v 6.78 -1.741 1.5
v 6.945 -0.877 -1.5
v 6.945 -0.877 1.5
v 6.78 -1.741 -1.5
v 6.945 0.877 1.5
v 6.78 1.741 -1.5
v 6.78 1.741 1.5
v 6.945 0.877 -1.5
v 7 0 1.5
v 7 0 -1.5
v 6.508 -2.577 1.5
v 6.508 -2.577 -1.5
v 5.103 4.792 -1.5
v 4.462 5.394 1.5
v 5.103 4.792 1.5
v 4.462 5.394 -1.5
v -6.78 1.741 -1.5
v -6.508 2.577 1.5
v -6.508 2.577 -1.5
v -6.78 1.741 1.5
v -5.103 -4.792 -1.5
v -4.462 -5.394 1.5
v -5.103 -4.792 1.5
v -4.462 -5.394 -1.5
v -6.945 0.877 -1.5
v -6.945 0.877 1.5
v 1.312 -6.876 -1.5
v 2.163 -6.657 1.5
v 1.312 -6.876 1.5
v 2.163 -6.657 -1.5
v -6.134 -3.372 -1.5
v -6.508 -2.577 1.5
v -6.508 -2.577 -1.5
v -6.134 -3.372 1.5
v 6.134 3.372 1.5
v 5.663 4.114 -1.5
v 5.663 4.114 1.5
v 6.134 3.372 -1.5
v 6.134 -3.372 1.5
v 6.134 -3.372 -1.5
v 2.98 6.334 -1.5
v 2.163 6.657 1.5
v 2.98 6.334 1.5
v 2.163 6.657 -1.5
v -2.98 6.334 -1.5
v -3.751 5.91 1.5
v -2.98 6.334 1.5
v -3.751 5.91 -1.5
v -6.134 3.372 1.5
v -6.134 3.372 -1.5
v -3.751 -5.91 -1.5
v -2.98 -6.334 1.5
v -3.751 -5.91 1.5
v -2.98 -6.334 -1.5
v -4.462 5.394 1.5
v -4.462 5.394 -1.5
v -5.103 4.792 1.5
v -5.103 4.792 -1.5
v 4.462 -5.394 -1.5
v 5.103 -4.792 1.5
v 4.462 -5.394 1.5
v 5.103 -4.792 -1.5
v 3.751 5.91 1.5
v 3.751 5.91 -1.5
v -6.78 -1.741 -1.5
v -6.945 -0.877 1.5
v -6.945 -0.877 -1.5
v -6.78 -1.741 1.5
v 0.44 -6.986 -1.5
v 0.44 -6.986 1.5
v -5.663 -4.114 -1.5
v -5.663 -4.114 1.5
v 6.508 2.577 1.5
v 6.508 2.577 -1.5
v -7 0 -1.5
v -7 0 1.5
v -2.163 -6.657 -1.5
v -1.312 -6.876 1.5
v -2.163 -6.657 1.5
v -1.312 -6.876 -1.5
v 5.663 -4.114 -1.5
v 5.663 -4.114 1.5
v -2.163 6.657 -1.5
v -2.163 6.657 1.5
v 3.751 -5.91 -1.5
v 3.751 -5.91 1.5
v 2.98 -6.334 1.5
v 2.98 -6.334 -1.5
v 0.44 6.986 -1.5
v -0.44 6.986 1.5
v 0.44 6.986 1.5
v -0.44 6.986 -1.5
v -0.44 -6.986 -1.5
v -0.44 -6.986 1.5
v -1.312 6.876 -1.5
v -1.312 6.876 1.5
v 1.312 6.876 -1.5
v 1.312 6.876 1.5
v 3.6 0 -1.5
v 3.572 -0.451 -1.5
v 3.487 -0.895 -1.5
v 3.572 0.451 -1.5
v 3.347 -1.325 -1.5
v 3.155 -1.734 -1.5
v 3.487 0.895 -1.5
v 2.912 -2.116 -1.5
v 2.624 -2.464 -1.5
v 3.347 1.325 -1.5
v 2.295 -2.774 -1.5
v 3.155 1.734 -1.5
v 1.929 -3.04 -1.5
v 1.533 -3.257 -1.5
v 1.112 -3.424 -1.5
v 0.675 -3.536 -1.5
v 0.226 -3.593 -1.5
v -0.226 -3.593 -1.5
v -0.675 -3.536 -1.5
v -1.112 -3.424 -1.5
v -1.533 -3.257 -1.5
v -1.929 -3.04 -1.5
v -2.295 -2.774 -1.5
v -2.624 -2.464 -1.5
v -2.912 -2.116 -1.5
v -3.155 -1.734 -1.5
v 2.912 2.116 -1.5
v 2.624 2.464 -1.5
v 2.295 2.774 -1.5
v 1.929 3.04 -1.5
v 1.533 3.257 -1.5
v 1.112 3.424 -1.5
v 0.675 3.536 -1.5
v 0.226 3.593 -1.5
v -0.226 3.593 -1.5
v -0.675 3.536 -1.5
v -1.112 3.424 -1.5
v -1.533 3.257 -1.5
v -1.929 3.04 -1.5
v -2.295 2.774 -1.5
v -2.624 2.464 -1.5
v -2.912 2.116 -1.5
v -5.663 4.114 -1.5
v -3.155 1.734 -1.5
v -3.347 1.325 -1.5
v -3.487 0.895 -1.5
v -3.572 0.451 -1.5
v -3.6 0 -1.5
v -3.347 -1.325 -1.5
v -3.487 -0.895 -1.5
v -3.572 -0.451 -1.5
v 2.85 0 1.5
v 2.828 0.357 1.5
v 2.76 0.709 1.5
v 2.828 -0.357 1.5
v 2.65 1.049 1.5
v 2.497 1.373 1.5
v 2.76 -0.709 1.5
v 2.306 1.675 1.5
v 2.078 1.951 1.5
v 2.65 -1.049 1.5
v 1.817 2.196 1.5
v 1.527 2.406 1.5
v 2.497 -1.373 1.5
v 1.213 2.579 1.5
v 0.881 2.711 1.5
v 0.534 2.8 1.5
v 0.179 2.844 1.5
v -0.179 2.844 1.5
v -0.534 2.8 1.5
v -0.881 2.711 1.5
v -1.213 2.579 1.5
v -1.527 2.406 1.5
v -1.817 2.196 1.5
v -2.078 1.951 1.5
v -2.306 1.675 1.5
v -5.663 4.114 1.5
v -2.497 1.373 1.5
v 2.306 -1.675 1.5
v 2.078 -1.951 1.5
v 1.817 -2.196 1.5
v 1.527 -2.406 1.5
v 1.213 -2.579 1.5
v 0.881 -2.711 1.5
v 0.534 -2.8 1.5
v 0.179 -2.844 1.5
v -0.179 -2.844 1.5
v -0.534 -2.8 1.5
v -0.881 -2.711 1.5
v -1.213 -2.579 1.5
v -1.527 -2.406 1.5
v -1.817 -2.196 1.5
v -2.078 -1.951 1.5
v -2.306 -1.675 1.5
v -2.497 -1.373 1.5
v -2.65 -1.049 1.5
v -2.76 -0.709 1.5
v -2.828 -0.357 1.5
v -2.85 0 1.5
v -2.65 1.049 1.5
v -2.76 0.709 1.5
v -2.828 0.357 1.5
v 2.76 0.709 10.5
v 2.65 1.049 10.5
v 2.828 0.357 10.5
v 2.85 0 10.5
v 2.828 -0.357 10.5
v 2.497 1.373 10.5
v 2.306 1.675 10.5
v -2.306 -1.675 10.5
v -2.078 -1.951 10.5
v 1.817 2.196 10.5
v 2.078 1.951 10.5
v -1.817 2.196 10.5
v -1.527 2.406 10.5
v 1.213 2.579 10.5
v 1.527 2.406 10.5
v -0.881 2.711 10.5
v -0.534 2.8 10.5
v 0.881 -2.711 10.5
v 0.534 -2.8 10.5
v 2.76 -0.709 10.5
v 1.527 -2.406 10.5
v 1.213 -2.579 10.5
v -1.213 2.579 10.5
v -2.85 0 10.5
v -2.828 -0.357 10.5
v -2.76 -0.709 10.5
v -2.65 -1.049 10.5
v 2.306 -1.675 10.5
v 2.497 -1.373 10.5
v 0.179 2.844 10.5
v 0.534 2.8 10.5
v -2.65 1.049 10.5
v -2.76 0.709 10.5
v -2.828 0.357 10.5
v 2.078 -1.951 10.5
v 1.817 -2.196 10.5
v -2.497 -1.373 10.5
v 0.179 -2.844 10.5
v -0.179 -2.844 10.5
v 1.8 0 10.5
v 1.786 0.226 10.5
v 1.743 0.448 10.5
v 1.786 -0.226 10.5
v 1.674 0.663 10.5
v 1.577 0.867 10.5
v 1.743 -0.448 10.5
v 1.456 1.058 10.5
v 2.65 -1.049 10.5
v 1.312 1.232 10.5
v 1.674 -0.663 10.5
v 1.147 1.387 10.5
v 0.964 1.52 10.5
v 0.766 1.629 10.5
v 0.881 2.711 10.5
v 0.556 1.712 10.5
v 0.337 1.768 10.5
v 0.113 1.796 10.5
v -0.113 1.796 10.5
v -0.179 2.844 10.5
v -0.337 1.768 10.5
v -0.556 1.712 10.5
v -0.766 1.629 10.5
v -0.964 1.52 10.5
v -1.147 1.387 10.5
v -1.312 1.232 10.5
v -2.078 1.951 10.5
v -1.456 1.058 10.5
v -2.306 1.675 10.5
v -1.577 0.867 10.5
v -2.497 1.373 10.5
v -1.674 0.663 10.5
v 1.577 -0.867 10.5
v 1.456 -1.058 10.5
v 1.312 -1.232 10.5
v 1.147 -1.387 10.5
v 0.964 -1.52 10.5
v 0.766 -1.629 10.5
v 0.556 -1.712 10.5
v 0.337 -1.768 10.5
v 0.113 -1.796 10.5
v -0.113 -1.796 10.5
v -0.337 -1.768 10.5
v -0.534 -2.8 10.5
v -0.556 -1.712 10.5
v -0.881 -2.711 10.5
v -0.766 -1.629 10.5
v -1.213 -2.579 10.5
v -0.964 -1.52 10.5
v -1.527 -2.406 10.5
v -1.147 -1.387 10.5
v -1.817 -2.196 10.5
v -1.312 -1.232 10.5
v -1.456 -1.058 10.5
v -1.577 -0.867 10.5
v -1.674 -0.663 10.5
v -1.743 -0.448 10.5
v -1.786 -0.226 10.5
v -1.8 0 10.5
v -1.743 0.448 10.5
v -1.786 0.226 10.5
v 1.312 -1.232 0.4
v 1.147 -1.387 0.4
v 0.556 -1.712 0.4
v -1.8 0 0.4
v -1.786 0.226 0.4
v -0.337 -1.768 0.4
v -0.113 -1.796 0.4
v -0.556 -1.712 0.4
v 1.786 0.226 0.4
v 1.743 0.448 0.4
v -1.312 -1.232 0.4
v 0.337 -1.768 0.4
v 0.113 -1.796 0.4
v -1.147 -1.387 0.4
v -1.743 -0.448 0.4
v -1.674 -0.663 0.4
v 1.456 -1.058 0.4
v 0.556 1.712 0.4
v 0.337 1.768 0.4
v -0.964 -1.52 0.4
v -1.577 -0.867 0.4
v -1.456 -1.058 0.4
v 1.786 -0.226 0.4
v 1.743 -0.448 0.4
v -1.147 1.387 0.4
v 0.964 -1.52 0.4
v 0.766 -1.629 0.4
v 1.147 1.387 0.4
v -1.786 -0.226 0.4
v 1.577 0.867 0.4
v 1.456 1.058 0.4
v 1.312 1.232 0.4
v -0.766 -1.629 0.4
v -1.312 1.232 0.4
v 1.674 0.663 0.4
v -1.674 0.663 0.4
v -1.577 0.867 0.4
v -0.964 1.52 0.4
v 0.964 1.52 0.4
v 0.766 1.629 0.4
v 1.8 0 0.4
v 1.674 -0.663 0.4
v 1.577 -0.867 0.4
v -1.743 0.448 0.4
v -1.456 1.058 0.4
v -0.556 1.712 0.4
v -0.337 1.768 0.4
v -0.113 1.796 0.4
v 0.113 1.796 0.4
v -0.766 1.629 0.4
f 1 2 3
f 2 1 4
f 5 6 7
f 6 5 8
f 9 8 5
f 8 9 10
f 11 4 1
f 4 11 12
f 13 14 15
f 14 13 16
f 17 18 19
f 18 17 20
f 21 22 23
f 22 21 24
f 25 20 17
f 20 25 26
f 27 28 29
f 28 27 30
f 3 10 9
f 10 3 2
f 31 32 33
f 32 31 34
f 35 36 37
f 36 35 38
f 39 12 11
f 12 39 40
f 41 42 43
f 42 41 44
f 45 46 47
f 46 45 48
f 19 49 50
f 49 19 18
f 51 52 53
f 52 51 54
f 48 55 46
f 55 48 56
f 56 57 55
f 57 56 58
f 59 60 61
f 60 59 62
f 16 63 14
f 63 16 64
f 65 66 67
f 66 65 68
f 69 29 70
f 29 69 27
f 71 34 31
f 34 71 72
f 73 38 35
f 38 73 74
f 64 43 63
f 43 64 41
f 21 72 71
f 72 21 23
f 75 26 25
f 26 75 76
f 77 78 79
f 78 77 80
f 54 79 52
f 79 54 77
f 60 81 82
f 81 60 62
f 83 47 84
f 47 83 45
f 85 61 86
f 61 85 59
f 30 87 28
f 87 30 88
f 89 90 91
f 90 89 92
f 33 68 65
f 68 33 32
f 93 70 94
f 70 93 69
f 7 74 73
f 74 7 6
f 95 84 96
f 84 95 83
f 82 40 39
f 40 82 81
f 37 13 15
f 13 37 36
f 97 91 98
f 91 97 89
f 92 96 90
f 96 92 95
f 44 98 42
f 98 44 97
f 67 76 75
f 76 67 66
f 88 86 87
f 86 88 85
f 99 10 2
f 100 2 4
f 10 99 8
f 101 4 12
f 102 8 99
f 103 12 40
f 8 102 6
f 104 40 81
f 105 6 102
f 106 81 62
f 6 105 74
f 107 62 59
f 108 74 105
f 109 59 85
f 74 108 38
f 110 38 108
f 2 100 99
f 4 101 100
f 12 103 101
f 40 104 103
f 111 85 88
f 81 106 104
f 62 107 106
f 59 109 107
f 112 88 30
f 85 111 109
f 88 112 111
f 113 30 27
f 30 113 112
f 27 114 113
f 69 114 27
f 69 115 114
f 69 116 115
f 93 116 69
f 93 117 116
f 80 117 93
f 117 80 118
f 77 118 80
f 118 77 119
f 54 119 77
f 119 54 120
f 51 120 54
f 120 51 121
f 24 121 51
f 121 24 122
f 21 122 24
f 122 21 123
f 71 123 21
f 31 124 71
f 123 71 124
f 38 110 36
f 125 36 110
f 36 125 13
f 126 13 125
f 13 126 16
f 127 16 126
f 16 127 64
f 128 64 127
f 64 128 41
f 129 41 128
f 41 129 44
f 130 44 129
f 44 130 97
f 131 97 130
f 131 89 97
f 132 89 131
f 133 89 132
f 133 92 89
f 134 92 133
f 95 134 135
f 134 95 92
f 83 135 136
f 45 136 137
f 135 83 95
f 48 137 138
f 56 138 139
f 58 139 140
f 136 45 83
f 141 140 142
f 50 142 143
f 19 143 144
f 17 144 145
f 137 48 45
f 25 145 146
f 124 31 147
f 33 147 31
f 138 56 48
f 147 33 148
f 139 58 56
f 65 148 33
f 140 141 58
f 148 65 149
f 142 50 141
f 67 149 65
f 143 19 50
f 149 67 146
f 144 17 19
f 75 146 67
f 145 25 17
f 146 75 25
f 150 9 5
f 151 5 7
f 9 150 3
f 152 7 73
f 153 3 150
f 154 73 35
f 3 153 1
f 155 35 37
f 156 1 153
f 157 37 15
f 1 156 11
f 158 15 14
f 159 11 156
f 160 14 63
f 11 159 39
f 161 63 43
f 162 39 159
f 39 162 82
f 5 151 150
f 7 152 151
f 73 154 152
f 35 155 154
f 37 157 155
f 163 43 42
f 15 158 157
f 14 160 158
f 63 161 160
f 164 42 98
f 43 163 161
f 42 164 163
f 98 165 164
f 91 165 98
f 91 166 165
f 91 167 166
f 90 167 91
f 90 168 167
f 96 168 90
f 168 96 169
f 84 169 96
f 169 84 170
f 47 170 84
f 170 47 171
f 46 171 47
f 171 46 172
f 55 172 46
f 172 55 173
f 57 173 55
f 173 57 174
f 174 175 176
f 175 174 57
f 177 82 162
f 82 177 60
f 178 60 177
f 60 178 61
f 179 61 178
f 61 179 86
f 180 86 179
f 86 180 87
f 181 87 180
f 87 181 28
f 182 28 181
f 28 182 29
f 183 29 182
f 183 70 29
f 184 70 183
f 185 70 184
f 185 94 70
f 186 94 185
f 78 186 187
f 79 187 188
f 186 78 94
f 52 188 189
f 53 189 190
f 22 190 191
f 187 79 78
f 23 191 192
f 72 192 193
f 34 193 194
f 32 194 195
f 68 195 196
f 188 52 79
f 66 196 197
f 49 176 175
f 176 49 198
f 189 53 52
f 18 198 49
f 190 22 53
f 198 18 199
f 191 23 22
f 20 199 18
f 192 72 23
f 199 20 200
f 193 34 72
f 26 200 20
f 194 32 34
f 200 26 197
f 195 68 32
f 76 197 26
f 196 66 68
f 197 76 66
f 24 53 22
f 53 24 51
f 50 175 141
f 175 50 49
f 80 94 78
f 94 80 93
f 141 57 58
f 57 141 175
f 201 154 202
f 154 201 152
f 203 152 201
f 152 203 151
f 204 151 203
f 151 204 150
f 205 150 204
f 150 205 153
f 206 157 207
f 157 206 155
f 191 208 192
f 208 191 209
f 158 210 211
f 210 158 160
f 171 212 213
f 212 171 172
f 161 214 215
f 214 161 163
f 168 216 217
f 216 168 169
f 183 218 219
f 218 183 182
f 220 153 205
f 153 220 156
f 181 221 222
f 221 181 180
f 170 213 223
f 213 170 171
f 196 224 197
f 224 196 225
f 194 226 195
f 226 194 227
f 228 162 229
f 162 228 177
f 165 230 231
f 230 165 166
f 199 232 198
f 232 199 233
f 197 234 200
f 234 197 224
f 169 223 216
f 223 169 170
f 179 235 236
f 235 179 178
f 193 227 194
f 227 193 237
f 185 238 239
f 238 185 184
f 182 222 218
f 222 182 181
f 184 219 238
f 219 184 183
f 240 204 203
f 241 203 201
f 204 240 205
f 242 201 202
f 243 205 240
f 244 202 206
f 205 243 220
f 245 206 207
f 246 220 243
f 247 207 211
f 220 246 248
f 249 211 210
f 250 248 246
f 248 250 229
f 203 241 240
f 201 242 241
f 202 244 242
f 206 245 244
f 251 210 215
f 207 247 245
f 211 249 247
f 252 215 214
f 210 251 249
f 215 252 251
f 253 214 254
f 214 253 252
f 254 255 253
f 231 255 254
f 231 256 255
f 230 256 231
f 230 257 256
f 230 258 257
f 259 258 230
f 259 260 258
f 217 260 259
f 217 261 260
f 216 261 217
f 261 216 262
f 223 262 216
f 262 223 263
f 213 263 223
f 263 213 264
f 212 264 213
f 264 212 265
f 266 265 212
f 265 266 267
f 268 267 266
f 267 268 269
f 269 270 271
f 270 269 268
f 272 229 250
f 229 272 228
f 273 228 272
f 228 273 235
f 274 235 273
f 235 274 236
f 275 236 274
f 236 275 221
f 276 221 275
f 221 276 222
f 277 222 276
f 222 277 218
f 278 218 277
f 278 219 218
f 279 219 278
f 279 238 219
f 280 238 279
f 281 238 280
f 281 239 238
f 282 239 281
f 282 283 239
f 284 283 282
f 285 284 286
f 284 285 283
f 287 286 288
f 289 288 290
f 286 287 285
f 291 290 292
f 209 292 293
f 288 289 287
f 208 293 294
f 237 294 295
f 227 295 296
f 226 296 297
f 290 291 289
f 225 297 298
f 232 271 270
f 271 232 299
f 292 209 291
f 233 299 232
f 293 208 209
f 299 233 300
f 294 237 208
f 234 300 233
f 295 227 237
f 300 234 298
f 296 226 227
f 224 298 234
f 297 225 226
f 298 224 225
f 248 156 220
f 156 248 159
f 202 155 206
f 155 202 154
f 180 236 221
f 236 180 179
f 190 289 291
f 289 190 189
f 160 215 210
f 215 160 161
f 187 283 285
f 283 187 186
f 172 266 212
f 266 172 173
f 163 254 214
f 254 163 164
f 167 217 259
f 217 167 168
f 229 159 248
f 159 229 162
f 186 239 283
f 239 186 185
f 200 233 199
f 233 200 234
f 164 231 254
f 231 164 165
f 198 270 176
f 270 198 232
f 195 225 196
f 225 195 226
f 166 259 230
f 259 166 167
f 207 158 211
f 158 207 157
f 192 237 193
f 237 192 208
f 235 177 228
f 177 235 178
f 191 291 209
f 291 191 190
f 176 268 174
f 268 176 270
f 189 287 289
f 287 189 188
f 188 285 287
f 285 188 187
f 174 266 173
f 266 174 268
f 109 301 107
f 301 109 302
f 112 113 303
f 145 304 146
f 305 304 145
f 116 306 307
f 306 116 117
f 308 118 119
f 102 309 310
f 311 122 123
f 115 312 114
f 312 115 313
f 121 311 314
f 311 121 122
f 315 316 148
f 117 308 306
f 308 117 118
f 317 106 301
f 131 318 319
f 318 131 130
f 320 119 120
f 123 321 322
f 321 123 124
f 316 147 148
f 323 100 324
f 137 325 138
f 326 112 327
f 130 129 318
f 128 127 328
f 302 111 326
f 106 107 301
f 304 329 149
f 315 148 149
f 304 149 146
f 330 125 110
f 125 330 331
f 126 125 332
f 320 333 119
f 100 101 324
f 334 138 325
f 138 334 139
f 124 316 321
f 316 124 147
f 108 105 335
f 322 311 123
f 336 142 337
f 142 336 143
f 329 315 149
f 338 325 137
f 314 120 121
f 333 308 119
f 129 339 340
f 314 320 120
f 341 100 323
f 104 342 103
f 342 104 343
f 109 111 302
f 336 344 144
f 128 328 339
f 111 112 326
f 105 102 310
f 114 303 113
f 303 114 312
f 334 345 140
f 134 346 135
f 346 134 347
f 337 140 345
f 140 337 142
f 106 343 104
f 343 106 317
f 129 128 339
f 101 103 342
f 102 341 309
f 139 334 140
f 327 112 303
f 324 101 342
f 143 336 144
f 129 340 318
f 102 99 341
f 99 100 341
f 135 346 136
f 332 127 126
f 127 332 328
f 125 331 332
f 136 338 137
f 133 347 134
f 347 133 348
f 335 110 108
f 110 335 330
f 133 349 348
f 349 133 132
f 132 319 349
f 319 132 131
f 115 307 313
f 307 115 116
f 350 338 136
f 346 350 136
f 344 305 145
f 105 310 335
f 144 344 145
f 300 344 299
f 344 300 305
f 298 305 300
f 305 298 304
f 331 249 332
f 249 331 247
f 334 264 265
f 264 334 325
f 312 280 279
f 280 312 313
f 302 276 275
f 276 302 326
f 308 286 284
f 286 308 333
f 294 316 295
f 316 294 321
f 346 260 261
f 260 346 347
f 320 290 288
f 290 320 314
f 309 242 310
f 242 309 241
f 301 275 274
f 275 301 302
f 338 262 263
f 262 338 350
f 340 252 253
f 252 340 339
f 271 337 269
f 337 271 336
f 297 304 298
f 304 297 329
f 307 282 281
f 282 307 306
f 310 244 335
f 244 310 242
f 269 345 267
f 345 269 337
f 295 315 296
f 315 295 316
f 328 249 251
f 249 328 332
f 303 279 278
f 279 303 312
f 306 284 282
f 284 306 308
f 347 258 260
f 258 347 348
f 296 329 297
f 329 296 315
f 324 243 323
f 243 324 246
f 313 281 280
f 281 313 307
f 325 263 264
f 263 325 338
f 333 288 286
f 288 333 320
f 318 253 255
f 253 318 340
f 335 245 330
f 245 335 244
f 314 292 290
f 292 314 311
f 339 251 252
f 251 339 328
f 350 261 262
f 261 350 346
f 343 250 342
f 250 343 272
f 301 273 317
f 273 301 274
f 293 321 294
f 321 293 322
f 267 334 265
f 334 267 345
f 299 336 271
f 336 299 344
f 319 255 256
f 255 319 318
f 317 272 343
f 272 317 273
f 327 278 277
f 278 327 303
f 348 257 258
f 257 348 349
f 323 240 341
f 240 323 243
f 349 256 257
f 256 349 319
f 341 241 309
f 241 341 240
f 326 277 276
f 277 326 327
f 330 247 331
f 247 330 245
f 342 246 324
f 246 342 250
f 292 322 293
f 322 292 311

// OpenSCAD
$fn = 50;


difference() {
	union() {
		translate(v = [0, 0, -1.5000000000]) {
			cylinder(h = 3, r = 7.0000000000);
		}
		translate(v = [0, 0, -1.5000000000]) {
			cylinder(h = 12, r = 2.8500000000);
		}
	}
	union() {
		translate(v = [0, 0, -1.5000000000]) {
			rotate(a = [0, 180, 0]) {
				difference() {
					union() {
						translate(v = [0, 0, -12.0000000000]) {
							cylinder(h = 12, r = 1.5000000000);
						}
						translate(v = [0, 0, -1.9000000000]) {
							cylinder(h = 1.9000000000, r1 = 1.8000000000, r2 = 3.6000000000);
						}
						translate(v = [0, 0, -12.0000000000]) {
							cylinder(h = 12, r = 1.8000000000);
						}
						translate(v = [0, 0, -12.0000000000]) {
							cylinder(h = 12, r = 1.5000000000);
						}
					}
					union();
				}
			}
		}
		translate(v = [0, 0, -50.0000000000]) {
			cylinder(h = 100, r = 1.8000000000);
		}
	}
}
